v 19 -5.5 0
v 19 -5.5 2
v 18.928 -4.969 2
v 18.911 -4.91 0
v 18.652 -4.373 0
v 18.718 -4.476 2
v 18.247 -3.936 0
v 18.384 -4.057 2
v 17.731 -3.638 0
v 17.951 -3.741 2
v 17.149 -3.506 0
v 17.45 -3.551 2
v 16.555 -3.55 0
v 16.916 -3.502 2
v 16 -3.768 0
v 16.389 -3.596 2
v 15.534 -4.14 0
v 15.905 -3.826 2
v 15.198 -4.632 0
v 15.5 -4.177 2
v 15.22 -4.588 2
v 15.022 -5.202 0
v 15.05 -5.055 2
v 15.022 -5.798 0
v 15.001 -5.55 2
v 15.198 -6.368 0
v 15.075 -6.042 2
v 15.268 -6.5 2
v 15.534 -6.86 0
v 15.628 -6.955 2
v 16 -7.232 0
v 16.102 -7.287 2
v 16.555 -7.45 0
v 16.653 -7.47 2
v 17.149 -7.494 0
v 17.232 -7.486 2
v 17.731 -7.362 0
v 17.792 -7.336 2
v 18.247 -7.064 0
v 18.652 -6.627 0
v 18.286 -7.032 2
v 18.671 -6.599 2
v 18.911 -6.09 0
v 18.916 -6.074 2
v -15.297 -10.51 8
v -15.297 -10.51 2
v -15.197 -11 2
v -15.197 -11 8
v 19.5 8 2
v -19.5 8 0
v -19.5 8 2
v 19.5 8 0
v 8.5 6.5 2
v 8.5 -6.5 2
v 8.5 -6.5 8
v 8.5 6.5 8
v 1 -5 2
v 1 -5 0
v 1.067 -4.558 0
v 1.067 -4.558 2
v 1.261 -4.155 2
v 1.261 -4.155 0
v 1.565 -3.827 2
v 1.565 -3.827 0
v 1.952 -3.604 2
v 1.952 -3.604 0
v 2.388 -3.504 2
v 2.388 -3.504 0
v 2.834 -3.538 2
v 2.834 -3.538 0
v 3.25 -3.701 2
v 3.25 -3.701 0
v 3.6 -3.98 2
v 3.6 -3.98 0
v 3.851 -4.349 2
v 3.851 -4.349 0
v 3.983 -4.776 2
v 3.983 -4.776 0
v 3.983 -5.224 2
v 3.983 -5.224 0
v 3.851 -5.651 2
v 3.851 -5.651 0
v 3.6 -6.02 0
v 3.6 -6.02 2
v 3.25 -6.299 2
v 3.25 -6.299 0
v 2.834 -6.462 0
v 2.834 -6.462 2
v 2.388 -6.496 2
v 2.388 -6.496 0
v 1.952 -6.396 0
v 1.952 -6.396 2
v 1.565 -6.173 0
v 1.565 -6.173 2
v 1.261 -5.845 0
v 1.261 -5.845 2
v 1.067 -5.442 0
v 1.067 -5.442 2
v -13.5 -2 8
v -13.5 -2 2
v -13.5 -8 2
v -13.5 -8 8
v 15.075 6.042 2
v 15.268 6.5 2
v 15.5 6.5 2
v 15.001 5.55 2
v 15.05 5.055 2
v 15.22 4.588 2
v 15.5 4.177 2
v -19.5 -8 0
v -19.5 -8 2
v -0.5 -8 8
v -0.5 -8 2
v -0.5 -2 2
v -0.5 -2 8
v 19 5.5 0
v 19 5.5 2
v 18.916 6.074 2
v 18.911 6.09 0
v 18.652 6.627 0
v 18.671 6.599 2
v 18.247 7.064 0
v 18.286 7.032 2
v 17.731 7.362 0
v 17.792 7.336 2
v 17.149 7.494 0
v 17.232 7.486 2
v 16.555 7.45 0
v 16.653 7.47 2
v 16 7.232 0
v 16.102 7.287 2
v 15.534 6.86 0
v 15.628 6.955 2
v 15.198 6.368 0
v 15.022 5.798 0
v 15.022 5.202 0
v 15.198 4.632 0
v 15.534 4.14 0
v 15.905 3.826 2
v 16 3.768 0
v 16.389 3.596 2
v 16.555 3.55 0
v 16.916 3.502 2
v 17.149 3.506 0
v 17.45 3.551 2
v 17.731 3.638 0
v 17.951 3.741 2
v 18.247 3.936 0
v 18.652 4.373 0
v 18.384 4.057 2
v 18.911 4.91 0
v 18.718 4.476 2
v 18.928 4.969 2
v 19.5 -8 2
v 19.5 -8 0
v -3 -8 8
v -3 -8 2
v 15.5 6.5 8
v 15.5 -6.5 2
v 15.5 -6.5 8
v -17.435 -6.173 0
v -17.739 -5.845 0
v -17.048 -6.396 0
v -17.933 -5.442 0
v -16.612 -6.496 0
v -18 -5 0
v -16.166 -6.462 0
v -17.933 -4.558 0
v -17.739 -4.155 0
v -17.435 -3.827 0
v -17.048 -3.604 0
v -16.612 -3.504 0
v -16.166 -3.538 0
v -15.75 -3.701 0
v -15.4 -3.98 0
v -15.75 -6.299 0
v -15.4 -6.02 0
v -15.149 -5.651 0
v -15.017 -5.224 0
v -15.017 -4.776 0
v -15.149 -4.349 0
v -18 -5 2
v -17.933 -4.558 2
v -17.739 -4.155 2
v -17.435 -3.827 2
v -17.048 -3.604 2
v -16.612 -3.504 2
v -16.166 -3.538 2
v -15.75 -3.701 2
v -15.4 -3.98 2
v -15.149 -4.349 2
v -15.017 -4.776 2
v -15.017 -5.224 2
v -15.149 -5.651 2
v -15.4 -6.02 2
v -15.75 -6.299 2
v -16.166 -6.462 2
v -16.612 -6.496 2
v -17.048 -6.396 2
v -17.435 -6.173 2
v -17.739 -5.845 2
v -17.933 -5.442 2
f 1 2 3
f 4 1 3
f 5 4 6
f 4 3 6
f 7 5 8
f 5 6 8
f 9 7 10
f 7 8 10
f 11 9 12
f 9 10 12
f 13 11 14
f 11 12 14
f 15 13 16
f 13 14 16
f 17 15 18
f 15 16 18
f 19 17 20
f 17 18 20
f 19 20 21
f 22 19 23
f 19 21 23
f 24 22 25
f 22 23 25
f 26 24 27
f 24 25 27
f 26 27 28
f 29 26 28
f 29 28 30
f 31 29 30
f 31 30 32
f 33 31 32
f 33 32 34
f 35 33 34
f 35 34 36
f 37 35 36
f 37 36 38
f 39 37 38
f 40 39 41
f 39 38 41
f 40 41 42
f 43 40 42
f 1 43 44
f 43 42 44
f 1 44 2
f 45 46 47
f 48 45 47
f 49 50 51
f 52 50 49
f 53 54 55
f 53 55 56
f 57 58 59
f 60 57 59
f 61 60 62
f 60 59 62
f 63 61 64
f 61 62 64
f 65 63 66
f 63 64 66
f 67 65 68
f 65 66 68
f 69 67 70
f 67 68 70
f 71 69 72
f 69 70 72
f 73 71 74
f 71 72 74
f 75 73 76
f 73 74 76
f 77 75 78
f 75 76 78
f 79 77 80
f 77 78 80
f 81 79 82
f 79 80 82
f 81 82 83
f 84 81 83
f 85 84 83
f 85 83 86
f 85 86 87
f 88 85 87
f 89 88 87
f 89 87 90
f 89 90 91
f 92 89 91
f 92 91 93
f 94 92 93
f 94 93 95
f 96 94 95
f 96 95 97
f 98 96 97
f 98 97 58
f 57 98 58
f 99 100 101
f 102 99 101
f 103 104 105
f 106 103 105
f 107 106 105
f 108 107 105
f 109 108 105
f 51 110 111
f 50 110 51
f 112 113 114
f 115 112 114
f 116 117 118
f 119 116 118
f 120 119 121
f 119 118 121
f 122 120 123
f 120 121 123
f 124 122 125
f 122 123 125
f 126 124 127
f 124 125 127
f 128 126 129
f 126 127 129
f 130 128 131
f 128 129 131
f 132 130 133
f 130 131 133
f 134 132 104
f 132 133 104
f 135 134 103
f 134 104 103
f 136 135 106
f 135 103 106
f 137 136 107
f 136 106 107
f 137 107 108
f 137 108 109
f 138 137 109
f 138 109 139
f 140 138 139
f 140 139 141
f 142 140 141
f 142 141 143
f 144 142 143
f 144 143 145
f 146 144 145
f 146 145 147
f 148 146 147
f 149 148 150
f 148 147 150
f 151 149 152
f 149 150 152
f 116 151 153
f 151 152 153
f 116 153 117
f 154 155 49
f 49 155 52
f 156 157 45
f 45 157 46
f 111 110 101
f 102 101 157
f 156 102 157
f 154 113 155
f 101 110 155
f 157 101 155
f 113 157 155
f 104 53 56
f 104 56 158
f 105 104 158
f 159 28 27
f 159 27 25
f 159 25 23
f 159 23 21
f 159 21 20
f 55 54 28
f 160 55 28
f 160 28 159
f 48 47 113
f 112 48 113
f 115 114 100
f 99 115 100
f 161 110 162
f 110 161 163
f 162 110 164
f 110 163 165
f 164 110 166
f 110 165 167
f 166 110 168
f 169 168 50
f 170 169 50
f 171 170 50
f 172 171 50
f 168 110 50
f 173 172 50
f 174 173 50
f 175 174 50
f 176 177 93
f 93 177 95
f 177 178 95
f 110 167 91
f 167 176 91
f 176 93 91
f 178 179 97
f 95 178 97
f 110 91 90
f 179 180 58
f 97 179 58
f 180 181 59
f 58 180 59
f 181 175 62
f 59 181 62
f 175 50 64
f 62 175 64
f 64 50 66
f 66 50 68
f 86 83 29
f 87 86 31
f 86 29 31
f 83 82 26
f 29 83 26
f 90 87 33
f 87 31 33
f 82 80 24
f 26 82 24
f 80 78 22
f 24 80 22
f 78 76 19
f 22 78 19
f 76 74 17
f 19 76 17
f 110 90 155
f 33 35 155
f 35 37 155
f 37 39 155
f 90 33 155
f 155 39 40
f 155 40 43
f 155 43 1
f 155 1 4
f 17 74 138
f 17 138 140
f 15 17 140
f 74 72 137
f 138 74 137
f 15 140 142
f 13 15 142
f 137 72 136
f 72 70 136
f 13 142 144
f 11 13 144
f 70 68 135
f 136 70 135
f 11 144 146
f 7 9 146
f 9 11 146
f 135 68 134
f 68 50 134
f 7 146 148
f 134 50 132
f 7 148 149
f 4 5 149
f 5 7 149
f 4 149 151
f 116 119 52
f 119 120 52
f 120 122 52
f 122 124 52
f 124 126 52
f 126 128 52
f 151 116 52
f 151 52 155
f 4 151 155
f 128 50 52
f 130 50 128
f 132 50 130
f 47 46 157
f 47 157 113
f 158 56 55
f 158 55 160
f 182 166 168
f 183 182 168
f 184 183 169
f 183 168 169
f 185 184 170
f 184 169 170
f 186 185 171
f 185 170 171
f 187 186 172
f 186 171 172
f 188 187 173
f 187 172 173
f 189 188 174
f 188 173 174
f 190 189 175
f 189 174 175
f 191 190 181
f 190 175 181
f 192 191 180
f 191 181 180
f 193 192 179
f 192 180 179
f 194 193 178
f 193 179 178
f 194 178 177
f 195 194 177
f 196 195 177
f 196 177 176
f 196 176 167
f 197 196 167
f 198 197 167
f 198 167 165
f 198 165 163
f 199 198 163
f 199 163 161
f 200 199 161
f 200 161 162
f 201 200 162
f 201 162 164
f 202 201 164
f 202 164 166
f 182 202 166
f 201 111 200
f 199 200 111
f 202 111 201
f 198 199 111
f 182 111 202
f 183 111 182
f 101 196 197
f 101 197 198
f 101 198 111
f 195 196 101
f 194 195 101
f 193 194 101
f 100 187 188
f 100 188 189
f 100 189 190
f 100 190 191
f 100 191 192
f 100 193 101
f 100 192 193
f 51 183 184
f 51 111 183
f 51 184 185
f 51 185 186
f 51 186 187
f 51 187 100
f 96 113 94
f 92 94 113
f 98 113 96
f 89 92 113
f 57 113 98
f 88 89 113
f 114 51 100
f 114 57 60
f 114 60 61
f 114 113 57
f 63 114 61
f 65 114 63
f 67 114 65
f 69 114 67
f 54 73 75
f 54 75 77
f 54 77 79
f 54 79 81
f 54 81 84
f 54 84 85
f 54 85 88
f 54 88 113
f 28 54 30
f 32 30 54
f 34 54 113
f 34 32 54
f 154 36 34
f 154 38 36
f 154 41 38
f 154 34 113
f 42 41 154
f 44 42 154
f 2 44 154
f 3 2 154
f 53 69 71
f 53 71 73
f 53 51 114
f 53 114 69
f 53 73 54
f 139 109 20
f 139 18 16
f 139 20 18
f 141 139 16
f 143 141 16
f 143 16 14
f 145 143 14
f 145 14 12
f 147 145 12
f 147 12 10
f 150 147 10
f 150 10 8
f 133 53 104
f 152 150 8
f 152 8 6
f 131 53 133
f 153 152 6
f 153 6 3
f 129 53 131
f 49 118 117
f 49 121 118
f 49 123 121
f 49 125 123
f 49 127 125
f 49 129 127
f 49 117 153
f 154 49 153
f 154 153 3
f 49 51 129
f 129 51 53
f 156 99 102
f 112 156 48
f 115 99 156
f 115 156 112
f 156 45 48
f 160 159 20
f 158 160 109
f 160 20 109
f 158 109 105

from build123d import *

# Parameters (mm, degrees)
F0_W     = 39
F0_H     = 16
F1_DEPTH = 2
F2_W     = 7
F2_H     = 13
F3_DEPTH = 6
F4_D     = 3
F5_D     = 4
F5_DEPTH = 2.001


with BuildPart() as f1:
    # F0 (on Top) → F1 (new body)
    with BuildSketch(Plane.XY):
        Rectangle(F0_W, F0_H)
    extrude(amount=F1_DEPTH)

    # F2 (on face) → F3 (join)
    with BuildSketch(Plane.XY.offset(2)):
        Polygon((-13.5, -2), (-13.5, -8), (-3, -8), (-0.5, -8), (-0.5, -2), align=None)
        with Locations((12, 0)):
            Rectangle(F2_W, F2_H)
        Polygon((-0.5, -8), (-3, -8), (-15.2969384567, -10.5101020514), (-15.1969384567, -11), align=None)
    extrude(amount=F3_DEPTH)

    # F4 (through all)
    with Locations(Plane.XY.offset(2)):
        with Locations((-16.5, -5), (2.5, -5)):
            Hole(F4_D / 2)

    # F5 (through all, one way)
    with BuildSketch(Plane.XY.offset(2)):
        with Locations((17, 5.5), (17, -5.5)):
            Circle(F5_D / 2)
    extrude(amount=-F5_DEPTH, mode=Mode.SUBTRACT)


solid = f1.part
